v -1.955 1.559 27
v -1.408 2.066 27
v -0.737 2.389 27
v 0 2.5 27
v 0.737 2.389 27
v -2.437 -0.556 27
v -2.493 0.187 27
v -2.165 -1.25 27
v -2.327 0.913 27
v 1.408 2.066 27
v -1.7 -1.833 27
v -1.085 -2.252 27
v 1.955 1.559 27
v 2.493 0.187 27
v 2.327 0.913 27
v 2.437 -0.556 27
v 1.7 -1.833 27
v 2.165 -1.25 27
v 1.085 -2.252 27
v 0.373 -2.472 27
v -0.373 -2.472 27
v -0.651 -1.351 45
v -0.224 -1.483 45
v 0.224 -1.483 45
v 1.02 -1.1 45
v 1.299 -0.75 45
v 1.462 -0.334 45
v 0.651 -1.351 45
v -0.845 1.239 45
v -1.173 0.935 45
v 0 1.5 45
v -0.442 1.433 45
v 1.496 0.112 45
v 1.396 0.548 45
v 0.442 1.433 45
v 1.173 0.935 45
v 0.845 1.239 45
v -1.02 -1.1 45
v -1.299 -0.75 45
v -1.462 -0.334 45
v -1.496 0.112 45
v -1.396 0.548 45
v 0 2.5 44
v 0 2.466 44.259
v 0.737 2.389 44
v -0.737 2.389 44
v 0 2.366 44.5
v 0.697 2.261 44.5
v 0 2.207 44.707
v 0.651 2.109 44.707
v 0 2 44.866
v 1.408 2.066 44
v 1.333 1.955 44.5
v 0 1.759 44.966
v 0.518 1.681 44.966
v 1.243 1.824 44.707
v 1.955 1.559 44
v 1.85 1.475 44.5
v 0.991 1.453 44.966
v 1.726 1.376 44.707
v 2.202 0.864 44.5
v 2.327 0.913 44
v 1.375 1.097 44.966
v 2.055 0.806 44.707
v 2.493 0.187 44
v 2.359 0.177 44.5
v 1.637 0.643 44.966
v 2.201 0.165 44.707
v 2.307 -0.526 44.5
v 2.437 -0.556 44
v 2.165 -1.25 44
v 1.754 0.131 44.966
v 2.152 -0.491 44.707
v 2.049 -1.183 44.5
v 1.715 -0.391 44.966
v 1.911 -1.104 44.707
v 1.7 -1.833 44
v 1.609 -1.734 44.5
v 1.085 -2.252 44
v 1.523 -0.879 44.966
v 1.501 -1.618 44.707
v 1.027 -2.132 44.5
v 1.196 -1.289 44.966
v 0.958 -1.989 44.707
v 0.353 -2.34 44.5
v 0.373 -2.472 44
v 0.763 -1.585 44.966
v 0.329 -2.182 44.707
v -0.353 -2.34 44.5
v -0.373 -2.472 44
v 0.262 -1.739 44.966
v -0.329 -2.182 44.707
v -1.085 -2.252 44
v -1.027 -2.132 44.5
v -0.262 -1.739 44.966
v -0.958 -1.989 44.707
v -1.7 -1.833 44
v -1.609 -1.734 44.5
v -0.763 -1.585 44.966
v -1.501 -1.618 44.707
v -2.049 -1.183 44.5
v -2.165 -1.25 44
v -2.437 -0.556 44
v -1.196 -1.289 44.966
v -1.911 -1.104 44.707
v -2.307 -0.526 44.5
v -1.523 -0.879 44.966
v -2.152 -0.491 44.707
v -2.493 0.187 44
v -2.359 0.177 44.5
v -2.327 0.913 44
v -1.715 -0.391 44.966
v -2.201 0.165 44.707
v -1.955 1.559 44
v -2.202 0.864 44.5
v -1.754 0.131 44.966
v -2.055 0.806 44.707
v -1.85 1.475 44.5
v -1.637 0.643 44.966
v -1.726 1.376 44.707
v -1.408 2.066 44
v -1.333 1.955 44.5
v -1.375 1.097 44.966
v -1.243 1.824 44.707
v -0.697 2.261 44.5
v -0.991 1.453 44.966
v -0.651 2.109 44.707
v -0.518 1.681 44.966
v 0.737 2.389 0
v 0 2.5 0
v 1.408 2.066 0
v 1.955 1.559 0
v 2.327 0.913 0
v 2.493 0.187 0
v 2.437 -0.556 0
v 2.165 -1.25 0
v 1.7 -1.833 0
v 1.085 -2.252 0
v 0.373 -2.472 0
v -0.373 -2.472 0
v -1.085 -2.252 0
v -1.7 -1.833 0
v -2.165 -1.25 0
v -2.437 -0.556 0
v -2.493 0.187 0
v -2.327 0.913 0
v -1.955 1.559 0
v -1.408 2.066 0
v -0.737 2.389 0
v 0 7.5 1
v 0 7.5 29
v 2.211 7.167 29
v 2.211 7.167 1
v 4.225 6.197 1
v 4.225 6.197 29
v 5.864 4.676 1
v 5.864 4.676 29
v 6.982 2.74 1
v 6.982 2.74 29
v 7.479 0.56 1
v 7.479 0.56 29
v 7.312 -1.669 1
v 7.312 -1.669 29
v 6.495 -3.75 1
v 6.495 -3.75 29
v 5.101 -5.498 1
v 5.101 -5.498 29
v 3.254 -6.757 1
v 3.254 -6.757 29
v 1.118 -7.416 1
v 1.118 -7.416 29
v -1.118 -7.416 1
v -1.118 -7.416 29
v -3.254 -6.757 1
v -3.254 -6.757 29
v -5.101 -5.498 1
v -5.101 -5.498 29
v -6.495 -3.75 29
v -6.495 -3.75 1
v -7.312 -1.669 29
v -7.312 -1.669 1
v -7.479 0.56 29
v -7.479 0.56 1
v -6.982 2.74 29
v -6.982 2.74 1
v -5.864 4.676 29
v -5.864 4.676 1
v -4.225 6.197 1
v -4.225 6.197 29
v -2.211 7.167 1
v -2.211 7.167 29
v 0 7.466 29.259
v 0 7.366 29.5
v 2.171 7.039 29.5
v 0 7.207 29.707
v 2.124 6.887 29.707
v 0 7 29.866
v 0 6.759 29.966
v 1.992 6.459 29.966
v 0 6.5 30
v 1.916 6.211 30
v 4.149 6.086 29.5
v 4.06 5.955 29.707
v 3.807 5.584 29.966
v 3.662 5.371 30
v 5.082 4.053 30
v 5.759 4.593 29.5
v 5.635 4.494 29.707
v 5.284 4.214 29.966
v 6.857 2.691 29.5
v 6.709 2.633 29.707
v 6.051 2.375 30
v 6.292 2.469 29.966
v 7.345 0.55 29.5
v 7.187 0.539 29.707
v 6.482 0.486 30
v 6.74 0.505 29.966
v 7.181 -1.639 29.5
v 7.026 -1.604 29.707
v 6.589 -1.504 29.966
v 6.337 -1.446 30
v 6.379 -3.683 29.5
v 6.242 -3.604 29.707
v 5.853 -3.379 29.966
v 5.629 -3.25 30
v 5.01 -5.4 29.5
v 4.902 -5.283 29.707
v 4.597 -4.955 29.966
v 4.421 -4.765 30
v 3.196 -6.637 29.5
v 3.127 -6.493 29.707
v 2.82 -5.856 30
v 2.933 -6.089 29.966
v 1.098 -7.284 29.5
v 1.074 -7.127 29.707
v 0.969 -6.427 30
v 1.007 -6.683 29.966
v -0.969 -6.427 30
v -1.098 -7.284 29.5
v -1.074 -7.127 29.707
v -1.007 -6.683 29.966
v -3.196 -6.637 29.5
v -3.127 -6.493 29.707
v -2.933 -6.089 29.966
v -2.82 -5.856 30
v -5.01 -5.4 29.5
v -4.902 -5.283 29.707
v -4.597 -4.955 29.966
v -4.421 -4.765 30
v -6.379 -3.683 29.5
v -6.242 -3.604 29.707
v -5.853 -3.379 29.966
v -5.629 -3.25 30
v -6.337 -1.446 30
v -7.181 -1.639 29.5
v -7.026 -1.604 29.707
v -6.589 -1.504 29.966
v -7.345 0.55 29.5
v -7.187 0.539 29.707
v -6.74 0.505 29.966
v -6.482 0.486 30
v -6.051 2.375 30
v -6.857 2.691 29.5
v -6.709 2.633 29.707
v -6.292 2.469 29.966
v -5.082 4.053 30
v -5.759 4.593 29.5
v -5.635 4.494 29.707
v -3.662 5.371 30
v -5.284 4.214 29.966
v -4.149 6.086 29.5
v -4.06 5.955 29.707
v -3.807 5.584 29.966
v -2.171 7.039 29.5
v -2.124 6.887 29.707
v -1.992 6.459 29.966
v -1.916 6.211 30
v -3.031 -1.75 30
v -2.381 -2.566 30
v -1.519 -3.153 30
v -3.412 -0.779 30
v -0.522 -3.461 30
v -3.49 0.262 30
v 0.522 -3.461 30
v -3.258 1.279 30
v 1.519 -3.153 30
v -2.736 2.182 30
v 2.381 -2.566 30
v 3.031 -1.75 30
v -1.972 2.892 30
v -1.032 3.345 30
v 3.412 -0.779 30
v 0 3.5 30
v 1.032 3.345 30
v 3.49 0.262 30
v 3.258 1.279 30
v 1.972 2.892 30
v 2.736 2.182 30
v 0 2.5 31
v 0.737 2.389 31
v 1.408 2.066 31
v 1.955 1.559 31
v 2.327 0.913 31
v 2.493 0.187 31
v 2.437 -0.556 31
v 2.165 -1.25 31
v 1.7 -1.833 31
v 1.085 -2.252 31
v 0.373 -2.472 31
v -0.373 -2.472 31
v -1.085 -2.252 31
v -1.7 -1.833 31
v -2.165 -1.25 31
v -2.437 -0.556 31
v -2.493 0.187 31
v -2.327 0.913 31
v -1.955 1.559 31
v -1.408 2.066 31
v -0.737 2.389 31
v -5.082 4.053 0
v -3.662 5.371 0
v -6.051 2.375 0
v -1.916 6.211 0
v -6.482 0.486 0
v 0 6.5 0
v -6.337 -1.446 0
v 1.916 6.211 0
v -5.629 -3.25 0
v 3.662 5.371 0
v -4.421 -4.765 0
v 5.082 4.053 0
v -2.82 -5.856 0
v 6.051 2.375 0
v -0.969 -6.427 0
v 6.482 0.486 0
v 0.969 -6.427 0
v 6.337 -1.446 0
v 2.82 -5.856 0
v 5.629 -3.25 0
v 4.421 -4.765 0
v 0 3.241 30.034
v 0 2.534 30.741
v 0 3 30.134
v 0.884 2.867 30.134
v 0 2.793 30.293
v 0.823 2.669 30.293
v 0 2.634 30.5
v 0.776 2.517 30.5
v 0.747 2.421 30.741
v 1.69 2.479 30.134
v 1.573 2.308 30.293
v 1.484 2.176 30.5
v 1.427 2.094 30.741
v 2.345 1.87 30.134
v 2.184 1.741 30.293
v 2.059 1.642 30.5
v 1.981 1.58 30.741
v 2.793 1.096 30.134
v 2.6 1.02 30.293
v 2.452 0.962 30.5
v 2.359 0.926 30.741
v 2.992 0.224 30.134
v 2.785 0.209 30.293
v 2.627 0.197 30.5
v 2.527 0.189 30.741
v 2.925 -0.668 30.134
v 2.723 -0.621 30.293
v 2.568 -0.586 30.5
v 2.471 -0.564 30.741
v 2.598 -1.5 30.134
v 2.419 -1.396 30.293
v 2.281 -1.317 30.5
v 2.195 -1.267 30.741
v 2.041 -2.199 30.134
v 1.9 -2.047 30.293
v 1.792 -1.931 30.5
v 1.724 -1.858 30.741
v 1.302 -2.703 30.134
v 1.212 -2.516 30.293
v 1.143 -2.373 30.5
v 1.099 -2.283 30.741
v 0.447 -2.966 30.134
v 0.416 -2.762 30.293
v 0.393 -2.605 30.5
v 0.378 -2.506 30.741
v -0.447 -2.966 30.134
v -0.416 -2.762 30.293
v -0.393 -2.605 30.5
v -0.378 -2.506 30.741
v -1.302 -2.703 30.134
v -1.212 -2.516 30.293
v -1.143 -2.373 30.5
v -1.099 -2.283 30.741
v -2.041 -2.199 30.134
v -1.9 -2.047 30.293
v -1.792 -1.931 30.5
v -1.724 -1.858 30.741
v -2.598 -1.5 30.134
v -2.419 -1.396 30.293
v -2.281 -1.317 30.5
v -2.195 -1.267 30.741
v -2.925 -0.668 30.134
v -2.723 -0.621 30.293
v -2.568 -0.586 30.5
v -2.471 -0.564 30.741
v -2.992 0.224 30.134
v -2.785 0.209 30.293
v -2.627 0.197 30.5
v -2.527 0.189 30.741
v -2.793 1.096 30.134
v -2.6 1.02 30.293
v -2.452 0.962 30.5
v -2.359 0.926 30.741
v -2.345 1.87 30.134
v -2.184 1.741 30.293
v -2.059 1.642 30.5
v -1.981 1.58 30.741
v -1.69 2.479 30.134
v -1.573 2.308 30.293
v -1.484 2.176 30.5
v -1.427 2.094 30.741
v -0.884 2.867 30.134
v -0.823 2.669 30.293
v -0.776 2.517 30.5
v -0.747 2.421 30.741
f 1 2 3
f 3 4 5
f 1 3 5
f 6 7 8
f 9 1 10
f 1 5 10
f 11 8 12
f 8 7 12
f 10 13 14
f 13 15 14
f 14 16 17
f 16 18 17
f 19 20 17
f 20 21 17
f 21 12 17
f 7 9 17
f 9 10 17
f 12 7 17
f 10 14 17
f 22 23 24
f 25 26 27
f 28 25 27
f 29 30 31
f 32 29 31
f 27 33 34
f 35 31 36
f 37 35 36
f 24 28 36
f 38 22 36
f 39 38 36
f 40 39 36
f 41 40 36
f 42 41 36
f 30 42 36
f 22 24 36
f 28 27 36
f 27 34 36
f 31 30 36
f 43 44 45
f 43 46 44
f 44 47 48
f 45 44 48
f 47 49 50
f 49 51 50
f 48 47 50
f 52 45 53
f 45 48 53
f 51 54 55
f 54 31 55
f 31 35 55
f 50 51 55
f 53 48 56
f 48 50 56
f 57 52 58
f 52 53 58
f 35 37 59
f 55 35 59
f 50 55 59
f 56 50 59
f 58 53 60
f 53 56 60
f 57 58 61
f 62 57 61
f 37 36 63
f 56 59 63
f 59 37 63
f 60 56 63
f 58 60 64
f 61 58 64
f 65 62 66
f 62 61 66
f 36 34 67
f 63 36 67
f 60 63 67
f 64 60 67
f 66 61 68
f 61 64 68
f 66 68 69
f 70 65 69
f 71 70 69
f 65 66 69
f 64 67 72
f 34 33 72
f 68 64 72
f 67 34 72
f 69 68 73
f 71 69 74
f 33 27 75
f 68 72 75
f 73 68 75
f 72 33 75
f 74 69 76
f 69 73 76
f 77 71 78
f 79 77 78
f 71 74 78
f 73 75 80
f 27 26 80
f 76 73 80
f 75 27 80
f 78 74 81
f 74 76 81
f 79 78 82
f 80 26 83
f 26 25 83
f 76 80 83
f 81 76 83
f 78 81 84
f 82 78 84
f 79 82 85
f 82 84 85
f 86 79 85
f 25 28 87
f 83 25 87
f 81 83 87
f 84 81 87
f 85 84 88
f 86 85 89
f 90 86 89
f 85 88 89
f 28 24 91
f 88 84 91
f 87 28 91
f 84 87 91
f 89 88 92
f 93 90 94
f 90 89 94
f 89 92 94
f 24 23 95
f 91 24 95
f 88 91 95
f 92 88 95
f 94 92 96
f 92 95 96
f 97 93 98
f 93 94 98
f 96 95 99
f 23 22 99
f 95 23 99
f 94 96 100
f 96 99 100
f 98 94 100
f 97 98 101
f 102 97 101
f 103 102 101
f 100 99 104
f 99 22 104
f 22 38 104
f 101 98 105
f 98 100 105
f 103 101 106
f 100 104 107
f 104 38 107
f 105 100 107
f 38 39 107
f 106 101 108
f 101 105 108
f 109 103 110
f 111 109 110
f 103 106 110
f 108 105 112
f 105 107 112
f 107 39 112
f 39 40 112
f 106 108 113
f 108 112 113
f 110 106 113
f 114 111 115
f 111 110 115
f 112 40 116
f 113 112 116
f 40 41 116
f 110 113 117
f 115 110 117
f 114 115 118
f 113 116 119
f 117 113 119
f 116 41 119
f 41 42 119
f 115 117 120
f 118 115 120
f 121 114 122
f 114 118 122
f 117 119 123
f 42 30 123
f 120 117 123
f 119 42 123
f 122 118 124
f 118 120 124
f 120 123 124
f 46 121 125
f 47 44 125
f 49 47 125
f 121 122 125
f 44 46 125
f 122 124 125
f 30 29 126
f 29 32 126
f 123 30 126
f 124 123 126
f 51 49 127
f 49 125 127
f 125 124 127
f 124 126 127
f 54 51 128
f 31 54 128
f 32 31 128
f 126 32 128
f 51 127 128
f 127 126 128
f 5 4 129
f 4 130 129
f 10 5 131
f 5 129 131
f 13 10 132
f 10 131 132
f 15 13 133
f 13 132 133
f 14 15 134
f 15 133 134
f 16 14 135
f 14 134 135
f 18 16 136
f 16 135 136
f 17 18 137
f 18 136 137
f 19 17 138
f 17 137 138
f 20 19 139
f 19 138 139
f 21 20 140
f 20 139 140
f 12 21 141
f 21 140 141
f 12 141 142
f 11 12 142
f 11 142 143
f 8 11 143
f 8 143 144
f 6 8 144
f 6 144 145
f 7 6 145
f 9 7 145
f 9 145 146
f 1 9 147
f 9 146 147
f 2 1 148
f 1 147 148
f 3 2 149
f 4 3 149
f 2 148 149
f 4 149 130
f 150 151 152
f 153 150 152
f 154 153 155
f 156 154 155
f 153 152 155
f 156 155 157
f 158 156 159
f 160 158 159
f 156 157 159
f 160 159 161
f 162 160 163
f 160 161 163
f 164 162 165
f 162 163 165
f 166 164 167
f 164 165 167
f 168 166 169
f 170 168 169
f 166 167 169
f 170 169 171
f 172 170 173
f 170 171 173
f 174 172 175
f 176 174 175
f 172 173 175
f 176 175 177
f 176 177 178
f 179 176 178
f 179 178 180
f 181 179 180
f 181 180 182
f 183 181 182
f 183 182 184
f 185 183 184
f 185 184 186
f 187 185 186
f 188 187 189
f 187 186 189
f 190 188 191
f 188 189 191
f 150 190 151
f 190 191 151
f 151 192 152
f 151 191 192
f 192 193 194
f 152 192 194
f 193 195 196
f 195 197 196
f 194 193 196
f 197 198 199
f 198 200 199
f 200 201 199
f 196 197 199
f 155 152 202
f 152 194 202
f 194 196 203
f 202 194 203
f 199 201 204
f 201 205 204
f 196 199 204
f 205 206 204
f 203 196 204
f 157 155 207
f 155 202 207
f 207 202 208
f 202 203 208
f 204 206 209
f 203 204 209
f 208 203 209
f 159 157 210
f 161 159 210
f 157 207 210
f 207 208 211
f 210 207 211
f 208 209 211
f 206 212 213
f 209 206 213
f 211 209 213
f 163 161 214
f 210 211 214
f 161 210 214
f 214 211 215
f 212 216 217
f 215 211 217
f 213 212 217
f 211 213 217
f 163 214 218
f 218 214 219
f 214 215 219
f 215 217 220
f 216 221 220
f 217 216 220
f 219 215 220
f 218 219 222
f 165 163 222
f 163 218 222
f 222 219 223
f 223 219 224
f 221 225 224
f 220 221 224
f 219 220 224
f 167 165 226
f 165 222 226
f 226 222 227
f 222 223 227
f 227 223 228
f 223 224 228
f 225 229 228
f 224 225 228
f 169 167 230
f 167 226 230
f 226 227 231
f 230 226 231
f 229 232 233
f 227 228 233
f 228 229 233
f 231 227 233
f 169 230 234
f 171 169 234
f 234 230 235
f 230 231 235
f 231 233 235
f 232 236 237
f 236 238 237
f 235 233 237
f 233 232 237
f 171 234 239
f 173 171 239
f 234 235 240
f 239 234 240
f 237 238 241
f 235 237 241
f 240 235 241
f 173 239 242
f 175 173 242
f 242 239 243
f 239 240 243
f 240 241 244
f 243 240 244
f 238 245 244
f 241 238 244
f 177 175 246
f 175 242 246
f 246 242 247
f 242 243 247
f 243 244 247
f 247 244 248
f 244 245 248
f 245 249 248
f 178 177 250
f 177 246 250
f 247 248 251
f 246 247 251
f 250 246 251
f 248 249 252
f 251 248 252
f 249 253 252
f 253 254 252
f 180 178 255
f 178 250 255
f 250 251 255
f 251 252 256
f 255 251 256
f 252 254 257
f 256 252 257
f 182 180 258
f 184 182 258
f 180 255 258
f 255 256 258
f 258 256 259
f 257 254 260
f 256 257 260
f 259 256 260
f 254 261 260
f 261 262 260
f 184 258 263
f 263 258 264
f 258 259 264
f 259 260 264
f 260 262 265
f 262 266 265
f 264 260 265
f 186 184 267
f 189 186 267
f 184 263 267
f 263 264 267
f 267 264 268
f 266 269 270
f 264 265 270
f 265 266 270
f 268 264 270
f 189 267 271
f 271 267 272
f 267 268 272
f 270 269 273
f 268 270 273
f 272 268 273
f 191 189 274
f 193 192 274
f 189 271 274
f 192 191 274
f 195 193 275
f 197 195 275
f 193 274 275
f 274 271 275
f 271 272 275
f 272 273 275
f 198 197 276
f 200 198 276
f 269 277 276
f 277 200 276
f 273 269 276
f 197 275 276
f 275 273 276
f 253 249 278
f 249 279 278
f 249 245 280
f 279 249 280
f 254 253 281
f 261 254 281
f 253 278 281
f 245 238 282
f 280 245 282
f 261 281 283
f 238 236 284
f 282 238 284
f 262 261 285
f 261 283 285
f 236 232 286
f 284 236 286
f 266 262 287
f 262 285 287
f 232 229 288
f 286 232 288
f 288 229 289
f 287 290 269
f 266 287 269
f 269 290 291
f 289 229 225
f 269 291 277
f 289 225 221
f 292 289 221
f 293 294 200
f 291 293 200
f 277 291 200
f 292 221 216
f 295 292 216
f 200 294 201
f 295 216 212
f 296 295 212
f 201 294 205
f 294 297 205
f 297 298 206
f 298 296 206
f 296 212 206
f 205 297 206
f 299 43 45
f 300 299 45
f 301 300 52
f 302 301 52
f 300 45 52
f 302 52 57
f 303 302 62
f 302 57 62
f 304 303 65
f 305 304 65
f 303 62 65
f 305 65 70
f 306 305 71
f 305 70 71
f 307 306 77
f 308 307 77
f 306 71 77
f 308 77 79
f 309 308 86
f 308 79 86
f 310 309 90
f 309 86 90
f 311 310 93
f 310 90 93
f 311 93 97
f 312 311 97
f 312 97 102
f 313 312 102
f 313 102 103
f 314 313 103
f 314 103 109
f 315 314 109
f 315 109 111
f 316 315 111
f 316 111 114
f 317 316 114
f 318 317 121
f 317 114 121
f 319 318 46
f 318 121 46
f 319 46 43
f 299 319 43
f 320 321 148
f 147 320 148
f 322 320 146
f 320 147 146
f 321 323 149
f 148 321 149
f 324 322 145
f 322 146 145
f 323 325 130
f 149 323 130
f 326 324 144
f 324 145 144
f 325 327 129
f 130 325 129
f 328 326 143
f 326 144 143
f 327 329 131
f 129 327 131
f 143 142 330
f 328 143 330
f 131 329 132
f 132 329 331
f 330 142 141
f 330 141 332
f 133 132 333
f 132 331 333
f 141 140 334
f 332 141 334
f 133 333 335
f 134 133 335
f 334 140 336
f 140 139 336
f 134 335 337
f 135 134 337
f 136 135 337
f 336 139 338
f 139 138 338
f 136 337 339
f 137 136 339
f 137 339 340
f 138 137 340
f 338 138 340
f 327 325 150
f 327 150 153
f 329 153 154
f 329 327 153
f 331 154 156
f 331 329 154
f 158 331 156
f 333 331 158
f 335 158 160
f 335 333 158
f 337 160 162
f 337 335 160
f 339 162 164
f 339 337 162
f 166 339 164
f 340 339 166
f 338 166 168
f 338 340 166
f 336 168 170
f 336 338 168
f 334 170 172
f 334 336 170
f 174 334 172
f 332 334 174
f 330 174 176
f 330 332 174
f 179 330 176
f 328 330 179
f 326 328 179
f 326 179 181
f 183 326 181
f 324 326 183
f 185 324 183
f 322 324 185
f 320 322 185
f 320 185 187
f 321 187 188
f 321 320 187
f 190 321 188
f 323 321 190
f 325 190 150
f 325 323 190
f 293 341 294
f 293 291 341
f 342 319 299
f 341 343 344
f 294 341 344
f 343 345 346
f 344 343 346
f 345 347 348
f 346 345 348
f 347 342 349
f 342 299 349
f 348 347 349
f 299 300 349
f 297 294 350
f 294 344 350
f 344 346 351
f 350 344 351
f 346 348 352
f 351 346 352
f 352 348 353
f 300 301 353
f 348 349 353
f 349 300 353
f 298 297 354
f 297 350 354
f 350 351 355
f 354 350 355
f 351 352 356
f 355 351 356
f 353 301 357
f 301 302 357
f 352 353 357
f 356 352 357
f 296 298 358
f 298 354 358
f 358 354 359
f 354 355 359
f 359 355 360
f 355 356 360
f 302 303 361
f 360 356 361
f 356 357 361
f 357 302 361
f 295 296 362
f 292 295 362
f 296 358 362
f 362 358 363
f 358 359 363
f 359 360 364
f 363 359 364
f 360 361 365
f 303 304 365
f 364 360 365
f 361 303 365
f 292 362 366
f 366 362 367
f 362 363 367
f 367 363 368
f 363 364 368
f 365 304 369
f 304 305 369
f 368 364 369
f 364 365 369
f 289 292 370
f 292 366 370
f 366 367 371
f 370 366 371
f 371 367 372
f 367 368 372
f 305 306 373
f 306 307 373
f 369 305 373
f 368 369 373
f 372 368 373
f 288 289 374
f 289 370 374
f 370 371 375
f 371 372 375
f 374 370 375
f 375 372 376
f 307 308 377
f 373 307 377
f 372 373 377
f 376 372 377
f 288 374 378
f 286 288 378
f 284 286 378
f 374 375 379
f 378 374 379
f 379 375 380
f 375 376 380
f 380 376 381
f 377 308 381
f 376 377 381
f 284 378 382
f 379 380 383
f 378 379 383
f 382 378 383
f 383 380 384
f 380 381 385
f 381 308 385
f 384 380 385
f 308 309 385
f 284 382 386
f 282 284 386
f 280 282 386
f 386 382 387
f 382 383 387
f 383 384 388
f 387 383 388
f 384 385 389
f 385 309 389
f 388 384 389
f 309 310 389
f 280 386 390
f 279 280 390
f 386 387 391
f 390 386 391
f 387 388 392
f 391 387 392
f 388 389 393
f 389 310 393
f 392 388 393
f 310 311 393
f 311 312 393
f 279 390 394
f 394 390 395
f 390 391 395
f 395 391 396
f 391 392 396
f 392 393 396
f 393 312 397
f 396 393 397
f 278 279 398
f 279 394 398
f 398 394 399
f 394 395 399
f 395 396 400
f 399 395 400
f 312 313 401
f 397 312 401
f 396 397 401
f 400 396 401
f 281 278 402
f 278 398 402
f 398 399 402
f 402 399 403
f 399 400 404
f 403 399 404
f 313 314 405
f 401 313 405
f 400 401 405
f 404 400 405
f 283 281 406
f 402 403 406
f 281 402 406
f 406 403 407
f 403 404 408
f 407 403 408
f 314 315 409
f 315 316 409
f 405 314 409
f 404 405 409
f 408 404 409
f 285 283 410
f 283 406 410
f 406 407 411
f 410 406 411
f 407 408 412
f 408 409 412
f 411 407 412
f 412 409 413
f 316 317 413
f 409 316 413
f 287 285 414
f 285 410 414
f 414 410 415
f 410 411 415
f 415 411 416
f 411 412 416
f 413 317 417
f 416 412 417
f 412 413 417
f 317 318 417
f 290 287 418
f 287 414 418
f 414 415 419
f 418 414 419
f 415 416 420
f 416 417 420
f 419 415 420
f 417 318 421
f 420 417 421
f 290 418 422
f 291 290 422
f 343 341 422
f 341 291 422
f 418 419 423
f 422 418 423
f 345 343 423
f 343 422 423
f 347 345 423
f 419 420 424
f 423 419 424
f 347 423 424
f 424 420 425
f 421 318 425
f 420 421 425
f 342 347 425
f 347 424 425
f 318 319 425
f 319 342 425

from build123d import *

# Parameters (mm, degrees)
F2_R    = 1
F3_SIZE = 1


with BuildPart() as f1:
    # F0 (on Right) → F1 (revolve)
    with BuildSketch(Plane.YZ):
        Polygon((2.5, 27), (2.5, 0), (7.5, 0), (7.5, 30), (2.5, 30), (2.5, 45), (0, 45), (0, 27), align=None)
    revolve(axis=Axis((0, 0, 12.798217), (0, 0, -1)))

    # F2
    f2_edges = [f1.edges().sort_by_distance(p)[0] for p in [
        (0, -2.5, 45),
        (0, -2.5, 30),
        (0, -7.5, 30),
    ]]
    fillet(f2_edges, radius=F2_R)

    # F3
    f3_edges = [f1.edges().sort_by_distance(p)[0] for p in [
        (0, -7.5, 0),
    ]]
    chamfer(f3_edges, length=F3_SIZE)


solid = f1.part
